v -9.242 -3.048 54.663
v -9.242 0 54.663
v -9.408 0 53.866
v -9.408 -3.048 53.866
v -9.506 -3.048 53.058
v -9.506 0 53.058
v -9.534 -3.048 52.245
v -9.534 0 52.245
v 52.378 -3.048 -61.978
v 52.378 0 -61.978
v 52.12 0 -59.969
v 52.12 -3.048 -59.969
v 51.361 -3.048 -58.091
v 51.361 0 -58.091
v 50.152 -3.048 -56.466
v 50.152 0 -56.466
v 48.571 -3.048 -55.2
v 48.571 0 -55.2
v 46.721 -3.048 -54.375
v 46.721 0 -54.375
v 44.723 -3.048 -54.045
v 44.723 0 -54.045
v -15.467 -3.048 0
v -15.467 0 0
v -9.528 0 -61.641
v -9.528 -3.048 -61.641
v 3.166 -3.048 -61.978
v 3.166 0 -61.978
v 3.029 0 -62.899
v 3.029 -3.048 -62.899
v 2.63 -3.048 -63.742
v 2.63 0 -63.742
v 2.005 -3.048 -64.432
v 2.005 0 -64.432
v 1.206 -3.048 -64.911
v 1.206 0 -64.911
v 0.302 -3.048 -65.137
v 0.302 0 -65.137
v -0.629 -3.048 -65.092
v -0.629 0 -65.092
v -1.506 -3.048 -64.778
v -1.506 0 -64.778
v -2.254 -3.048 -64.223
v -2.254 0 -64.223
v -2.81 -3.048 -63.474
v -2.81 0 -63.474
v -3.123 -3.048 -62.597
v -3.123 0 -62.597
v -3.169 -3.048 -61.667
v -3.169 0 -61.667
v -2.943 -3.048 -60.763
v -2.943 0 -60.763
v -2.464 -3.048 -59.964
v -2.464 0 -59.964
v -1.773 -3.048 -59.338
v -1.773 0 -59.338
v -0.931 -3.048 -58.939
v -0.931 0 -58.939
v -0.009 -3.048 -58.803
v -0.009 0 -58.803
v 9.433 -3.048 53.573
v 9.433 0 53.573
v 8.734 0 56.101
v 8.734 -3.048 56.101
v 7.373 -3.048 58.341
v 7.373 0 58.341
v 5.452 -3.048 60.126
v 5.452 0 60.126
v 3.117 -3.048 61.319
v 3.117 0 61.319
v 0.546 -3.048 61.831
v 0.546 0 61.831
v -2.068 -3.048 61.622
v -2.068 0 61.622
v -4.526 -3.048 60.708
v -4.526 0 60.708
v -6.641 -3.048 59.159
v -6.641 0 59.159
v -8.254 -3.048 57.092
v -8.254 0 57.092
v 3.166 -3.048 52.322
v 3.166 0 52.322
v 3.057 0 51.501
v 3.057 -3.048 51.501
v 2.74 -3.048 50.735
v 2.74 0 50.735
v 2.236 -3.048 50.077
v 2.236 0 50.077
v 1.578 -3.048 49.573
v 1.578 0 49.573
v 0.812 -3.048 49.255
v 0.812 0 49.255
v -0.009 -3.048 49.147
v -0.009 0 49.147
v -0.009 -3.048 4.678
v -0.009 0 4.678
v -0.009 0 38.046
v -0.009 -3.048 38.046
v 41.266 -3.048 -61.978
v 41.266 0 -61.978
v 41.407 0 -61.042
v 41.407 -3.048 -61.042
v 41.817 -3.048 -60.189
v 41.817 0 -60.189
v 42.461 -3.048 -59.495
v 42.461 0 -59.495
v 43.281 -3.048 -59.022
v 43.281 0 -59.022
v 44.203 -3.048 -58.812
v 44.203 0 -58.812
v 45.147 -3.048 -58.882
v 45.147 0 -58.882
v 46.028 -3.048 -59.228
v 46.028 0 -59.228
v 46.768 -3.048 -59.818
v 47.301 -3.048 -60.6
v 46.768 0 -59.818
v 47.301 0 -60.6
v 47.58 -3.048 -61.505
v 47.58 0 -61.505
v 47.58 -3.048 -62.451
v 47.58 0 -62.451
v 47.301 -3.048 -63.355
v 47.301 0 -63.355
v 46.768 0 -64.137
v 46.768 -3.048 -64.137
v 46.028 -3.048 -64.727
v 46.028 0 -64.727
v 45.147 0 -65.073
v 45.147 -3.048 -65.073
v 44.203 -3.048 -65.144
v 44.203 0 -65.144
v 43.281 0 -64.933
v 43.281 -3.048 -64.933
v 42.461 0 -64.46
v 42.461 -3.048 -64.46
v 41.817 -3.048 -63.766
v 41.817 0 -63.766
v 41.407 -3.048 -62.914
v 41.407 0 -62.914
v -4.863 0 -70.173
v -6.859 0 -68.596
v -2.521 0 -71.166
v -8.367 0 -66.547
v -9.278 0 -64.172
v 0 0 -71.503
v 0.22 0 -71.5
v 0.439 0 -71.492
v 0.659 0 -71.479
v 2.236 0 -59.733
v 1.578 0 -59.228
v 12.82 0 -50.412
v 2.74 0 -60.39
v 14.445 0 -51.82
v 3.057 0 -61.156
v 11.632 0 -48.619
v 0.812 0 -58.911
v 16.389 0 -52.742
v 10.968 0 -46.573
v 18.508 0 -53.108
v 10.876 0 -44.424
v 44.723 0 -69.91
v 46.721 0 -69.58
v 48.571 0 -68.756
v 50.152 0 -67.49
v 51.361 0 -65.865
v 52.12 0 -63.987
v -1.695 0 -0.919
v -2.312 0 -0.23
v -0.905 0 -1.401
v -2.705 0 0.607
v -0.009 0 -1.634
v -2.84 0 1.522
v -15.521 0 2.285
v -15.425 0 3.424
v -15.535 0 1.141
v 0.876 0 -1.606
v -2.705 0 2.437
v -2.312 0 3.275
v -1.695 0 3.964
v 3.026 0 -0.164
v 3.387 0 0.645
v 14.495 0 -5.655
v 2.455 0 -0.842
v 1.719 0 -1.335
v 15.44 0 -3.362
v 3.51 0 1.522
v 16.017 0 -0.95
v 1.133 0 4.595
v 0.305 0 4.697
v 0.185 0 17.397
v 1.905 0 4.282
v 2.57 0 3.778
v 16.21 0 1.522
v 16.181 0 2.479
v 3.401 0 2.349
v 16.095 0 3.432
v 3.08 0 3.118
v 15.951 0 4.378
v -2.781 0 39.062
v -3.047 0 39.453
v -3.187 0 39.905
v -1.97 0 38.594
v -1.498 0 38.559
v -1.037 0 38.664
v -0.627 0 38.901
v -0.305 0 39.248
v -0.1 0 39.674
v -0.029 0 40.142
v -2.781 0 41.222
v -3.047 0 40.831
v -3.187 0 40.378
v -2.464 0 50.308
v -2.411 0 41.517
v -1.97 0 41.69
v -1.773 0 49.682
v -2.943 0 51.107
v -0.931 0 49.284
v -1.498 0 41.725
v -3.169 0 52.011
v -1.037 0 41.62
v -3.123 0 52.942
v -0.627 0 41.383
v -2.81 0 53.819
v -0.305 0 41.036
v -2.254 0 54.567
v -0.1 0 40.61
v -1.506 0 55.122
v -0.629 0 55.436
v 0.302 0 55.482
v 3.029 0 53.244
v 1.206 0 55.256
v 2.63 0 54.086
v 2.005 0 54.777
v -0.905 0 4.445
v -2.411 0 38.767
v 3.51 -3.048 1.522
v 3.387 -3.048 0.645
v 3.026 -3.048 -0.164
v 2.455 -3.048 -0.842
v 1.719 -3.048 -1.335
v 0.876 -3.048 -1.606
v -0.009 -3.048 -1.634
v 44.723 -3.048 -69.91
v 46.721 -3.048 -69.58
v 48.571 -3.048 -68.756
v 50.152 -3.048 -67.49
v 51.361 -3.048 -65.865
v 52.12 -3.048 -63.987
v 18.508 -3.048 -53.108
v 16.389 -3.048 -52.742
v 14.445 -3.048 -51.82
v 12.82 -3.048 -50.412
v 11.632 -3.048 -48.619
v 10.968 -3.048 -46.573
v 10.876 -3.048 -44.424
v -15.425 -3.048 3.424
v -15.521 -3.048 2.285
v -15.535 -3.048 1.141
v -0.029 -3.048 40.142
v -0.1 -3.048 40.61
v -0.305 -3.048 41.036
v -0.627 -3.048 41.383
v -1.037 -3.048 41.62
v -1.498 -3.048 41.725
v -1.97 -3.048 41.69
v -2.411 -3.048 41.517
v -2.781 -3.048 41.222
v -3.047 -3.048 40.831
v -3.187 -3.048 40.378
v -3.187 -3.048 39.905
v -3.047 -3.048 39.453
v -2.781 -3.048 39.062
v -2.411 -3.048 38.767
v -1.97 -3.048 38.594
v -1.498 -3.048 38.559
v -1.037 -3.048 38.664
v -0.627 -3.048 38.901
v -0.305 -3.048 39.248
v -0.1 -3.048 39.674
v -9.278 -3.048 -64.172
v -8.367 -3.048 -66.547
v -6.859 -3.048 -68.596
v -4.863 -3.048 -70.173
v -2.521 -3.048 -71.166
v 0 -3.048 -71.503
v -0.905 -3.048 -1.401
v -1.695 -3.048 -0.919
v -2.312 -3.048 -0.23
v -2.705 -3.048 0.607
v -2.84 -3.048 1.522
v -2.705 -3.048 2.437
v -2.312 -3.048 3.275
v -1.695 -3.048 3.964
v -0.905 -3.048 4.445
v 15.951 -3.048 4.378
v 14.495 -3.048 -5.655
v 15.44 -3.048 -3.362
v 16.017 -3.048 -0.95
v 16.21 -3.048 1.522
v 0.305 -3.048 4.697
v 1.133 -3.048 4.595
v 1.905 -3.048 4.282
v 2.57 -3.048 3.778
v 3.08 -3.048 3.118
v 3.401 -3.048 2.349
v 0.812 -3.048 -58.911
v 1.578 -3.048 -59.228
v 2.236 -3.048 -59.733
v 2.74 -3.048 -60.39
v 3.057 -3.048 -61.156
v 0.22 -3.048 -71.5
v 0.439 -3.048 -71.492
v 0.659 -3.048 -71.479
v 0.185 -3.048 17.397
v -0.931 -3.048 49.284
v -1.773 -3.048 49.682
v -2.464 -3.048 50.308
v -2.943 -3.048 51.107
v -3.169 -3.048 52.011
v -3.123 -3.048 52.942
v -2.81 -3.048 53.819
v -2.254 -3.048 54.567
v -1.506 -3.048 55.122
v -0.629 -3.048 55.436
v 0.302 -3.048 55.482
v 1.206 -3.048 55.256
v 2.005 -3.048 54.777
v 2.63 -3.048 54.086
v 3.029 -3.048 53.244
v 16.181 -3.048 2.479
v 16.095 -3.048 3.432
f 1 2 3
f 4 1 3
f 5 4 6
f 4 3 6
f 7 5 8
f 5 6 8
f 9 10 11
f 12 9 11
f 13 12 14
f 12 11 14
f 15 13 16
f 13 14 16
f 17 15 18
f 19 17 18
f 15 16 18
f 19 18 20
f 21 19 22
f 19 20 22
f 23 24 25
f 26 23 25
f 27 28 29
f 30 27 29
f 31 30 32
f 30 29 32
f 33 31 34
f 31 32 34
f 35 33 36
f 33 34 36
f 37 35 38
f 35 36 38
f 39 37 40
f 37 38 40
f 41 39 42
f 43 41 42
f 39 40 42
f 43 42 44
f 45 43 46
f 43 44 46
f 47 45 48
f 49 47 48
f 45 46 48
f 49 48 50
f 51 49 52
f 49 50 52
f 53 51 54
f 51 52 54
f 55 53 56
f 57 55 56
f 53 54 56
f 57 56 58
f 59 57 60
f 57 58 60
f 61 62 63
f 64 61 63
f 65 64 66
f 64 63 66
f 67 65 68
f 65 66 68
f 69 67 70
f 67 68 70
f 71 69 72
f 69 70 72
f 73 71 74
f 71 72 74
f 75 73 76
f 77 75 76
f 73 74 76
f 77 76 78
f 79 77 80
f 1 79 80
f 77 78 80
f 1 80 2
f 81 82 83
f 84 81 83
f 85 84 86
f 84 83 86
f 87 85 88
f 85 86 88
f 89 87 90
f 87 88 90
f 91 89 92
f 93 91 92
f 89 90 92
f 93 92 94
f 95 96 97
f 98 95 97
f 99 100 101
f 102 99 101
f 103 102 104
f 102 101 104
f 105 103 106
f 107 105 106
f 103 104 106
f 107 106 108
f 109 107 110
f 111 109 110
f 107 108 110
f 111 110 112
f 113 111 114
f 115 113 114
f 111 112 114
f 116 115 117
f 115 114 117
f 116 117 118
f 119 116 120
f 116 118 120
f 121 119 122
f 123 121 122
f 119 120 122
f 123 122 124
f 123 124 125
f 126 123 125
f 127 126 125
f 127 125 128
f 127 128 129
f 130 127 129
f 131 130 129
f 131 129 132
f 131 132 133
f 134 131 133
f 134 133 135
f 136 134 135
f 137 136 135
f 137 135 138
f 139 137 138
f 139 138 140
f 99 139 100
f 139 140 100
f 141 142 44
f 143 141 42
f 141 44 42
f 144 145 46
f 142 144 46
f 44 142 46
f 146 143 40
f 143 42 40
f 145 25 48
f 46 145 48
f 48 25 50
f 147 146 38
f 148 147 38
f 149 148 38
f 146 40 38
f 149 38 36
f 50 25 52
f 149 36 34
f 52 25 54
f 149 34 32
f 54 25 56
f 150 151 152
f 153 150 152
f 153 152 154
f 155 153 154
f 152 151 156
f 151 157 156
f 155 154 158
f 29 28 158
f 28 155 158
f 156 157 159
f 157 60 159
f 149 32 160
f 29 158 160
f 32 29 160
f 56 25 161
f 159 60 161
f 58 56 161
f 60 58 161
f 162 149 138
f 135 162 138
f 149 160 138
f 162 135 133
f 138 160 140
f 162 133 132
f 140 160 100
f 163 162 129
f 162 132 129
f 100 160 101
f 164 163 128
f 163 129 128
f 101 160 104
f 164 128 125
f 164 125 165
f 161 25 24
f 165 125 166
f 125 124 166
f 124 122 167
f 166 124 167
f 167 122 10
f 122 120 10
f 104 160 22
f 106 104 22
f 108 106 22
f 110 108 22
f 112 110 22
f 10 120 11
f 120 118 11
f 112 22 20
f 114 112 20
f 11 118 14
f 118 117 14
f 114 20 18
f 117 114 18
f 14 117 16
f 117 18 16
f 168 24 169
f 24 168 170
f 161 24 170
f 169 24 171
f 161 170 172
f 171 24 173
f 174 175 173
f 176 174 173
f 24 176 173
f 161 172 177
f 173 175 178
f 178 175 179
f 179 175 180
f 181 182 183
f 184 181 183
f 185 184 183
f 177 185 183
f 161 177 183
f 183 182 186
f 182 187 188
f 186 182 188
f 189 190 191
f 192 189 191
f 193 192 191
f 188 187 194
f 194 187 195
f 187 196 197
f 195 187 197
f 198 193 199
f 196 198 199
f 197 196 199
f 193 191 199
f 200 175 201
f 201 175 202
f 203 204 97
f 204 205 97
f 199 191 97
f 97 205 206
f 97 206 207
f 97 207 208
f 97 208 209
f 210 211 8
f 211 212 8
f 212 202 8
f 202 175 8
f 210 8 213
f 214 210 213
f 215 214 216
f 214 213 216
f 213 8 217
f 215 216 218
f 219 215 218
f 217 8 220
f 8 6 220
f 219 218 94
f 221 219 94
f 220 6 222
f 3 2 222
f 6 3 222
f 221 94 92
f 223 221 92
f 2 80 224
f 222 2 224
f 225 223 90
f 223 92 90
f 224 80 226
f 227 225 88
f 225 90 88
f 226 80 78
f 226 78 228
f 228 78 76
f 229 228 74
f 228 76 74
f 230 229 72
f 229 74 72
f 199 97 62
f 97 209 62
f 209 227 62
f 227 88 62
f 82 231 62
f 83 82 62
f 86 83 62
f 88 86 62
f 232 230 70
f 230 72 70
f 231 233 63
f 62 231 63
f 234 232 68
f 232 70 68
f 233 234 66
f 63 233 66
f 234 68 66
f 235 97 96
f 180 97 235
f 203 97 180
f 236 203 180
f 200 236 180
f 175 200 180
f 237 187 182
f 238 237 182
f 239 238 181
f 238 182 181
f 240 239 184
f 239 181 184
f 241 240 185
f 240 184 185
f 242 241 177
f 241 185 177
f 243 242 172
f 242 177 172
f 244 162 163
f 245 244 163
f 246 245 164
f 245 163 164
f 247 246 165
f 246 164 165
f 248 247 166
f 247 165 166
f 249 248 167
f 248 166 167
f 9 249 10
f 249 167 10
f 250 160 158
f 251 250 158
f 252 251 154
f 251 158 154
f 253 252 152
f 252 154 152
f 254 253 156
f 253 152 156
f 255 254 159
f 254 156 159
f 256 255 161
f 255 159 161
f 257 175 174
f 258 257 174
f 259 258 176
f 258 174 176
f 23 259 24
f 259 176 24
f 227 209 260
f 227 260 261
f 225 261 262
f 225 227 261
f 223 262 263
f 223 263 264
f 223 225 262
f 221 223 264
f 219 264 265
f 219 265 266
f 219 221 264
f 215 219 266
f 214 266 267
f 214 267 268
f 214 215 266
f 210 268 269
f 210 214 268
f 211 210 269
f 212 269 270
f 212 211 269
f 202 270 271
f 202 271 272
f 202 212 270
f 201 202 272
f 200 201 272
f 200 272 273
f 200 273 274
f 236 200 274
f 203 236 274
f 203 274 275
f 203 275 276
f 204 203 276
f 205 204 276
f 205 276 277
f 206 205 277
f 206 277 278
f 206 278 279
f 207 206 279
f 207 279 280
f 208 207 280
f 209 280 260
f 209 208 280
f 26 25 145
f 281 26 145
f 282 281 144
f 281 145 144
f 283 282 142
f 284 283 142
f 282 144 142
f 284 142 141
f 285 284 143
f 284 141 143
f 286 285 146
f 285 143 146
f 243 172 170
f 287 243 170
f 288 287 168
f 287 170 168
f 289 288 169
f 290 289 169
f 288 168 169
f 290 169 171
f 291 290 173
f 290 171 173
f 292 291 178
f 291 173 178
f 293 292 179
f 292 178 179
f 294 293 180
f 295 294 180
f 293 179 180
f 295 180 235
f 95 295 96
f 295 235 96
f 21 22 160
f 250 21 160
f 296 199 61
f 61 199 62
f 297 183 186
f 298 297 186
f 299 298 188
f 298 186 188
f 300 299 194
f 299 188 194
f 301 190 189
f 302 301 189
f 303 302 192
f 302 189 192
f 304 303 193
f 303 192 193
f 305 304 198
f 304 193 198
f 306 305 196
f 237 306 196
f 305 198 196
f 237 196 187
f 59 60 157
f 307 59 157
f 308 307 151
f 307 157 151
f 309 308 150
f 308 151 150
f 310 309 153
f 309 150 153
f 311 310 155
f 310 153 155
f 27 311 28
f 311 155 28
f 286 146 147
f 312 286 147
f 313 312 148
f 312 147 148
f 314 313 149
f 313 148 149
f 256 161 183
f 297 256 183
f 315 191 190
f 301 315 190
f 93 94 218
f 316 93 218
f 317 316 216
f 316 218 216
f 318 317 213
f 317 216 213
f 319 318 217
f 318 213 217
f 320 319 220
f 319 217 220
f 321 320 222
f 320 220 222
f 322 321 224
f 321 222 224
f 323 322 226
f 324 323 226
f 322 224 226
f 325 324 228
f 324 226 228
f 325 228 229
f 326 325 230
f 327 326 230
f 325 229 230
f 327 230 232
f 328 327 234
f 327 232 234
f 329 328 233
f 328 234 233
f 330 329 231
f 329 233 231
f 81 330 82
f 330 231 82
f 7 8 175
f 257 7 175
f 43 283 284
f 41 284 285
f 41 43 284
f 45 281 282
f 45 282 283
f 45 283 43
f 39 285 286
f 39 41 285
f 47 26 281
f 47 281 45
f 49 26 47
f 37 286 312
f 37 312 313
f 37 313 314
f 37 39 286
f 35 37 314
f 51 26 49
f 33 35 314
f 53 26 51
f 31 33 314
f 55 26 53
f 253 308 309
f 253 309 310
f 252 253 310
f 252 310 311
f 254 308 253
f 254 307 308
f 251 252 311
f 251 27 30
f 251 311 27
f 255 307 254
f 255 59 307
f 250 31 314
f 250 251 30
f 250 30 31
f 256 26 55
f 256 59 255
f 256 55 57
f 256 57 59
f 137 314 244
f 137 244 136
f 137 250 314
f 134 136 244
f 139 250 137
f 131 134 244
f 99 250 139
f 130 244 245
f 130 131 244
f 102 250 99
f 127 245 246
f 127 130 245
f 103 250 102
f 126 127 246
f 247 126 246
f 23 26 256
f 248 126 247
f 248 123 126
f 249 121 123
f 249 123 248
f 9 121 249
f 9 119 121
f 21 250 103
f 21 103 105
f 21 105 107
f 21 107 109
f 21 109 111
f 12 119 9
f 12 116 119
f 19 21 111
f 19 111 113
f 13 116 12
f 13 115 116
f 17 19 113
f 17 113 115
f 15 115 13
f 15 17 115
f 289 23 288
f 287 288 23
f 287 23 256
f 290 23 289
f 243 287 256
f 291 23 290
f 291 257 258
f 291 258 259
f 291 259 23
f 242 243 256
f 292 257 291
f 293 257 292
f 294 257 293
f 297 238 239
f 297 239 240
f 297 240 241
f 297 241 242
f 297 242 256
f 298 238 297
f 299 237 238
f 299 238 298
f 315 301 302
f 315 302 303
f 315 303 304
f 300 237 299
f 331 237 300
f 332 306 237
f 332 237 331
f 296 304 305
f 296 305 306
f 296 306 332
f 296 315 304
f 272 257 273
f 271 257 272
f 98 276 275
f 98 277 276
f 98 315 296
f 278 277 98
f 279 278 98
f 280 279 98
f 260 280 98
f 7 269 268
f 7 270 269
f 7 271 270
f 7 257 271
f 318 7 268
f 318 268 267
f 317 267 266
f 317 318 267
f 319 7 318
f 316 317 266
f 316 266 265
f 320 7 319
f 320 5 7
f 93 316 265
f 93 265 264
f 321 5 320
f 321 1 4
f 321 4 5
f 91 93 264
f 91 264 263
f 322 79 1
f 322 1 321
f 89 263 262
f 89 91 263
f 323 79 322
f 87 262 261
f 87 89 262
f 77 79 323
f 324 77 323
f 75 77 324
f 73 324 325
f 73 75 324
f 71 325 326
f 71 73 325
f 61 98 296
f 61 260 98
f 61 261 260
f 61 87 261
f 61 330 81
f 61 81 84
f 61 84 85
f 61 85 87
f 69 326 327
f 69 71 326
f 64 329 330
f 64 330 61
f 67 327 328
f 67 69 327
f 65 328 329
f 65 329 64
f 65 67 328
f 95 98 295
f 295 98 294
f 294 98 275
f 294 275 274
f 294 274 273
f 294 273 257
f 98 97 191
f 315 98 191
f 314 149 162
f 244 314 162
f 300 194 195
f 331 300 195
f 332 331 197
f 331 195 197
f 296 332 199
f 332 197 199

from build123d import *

# Parameters (mm, degrees)
F0_R     = 1.5875
F1_DEPTH = 3.048


with BuildPart() as f1:
    # F0 (on Front) → F1 (new body)
    with BuildSketch(Plane.XZ):
        with BuildLine():
            ThreePointArc((-9.5341186691, 52.2447508267), (-6.7171678622, 45.5597172954), (-0.0094340062, 42.7972561321))
            ThreePointArc((-0.0094340062, 42.7972561321), (6.7257580846, 45.5870640413), (9.5155659938, 52.3222561321))
            ThreePointArc((9.5155659938, 52.3222561321), (9.4949130682, 52.9491625761), (9.4330438542, 53.573350395))
            ThreePointArc((9.4330438542, 53.573350395), (0.5455224312, 61.8310756357), (-9.2422673958, 54.6632842395))
            Line((-9.2422673958, 54.6632842395), (-9.5341186691, 52.2447508267))
        make_face()
        with BuildLine():
            ThreePointArc((3.1655659938, 52.3222561321), (2.235630024, 50.0771921018), (-0.0094340062, 49.1472561321))
            ThreePointArc((-0.0094340062, 49.1472561321), (-2.2544980365, 54.5673201623), (3.1655659938, 52.3222561321))
        make_face(mode=Mode.SUBTRACT)
        with BuildLine():
            ThreePointArc((9.5155659938, 52.3222561321), (6.7257580846, 45.5870640413), (-0.0094340062, 42.7972561321))
            Line((-0.0094340062, 42.7972561321), (-0.0094340062, 38.0458299899))
            Line((-0.0094340062, 38.0458299899), (0.1854236079, 17.3965493596))
            ThreePointArc((0.1854236079, 17.3965493596), (10.4432233162, 13.7633317509), (15.9512497798, 4.3780043978))
            Line((15.9512497798, 4.3780043978), (9.4330438542, 53.573350395))
            ThreePointArc((9.4330438542, 53.573350395), (9.4949130682, 52.9491625761), (9.5155659938, 52.3222561321))
        make_face()
        with BuildLine():
            Line((-0.0094340062, 38.0458299899), (-0.0094340062, 42.7972561321))
            ThreePointArc((-0.0094340062, 42.7972561321), (-6.7171678622, 45.5597172954), (-9.5341186691, 52.2447508267))
            Line((-9.5341186691, 52.2447508267), (-15.4254400006, 3.4241398184))
            ThreePointArc((-15.4254400006, 3.4241398184), (-10.3245703873, 13.2859483017), (-0.0094340062, 17.3935143465))
            Line((-0.0094340062, 17.3935143465), (-0.0094340062, 38.0458299899))
        make_face()
        with Locations((-1.6167838335, 40.1418484393)):
            Circle(F0_R, mode=Mode.SUBTRACT)
        with BuildLine():
            ThreePointArc((-9.2422673958, 54.6632842395), (-9.4658311447, 53.4633863439), (-9.5341186691, 52.2447508267))
            Line((-9.5341186691, 52.2447508267), (-9.2422673958, 54.6632842395))
        make_face()
        with BuildLine():
            Line((-0.0094340062, 4.678493973), (-0.0094340062, 17.3935143465))
            ThreePointArc((-0.0094340062, 17.3935143465), (-10.3245703873, 13.2859483017), (-15.4254400006, 3.4241398184))
            ThreePointArc((-15.4254400006, 3.4241398184), (-15.5386299257, 1.7131836533), (-15.4666248709, 0))
            ThreePointArc((-15.4666248709, 0), (-10.4652805135, -10.1123806344), (-0.0094340062, -14.3490020823))
            Line((-0.0094340062, -14.3490020823), (-0.0094340062, -1.6339817089))
            ThreePointArc((-0.0094340062, -1.6339817089), (-2.8397781032, 1.5222561321), (-0.0094340062, 4.678493973))
        make_face()
        with BuildLine():
            ThreePointArc((15.9512497798, 4.3780043978), (10.4432233162, 13.7633317509), (0.1854236079, 17.3965493596))
            Line((0.1854236079, 17.3965493596), (0.305262239, 4.6971147776))
            ThreePointArc((0.305262239, 4.6971147776), (2.5696684822, 3.7778876305), (3.5102218968, 1.5222561321))
            ThreePointArc((3.5102218968, 1.5222561321), (2.4549320784, -0.8415234148), (-0.0094340062, -1.6339817089))
            Line((-0.0094340062, -1.6339817089), (-0.0094340062, -14.3490020823))
            ThreePointArc((-0.0094340062, -14.3490020823), (8.4967936253, -12.09407127), (14.495092683, -5.6550472833))
            ThreePointArc((14.495092683, -5.6550472833), (15.7754870132, -2.1674373693), (16.2102218968, 1.5222561321))
            ThreePointArc((16.2102218968, 1.5222561321), (16.1453463055, 2.9559894332), (15.9512497798, 4.3780043978))
        make_face()
        with BuildLine():
            ThreePointArc((-0.0094340062, -14.3490020823), (-10.4652805135, -10.1123806344), (-15.4666248709, 0))
            Line((-15.4666248709, 0), (-9.5284841955, -61.6411305964))
            ThreePointArc((-9.5284841955, -61.6411305964), (-6.6245448741, -55.1245742942), (-0.0094340062, -52.4527438679))
            Line((-0.0094340062, -52.4527438679), (-0.0094340062, -14.3490020823))
        make_face()
        with BuildLine():
            ThreePointArc((14.495092683, -5.6550472833), (8.4967936253, -12.09407127), (-0.0094340062, -14.3490020823))
            Line((-0.0094340062, -14.3490020823), (-0.0094340062, -52.4527438679))
            ThreePointArc((-0.0094340062, -52.4527438679), (6.7257580846, -55.2425517771), (9.5155659938, -61.9777438679))
            Line((9.5155659938, -61.9777438679), (36.5030659938, -61.9777438679))
            ThreePointArc((36.5030659938, -61.9777438679), (38.9286766306, -56.2660907011), (44.7230299367, -54.0452713422))
            Line((44.7230299367, -54.0452713422), (18.5079615272, -53.1084211888))
            ThreePointArc((18.5079615272, -53.1084211888), (12.8201303591, -50.41150042), (10.8761098535, -44.4243818055))
            Line((10.8761098535, -44.4243818055), (14.495092683, -5.6550472833))
        make_face()
        with BuildLine():
            ThreePointArc((-0.0094340062, -52.4527438679), (-6.6245448741, -55.1245742942), (-9.5284841955, -61.6411305964))
            ThreePointArc((-9.5284841955, -61.6411305964), (-6.8593267813, -68.5962477752), (0, -71.502739196))
            Line((0, -71.502739196), (0.6586396335, -71.4792859855))
            ThreePointArc((0.6586396335, -71.4792859855), (6.9579552616, -68.4724426131), (9.5155659938, -61.9777438679))
            Line((9.5155659938, -61.9777438679), (3.1655659938, -61.9777438679))
            ThreePointArc((3.1655659938, -61.9777438679), (-2.2544980365, -64.2228078982), (-0.0094340062, -58.8027438679))
            Line((-0.0094340062, -58.8027438679), (-0.0094340062, -52.4527438679))
        make_face()
        with BuildLine():
            Line((0.6586396335, -71.4792859855), (0, -71.502739196))
            ThreePointArc((0, -71.502739196), (0.3295227253, -71.4967108988), (0.6586396335, -71.4792859855))
        make_face()
        with BuildLine():
            Line((36.5030659938, -61.9777438679), (9.5155659938, -61.9777438679))
            ThreePointArc((9.5155659938, -61.9777438679), (6.9579552616, -68.4724426131), (0.6586396335, -71.4792859855))
            Line((0.6586396335, -71.4792859855), (44.7230299367, -69.9102163936))
            ThreePointArc((44.7230299367, -69.9102163936), (38.9286766306, -67.6893970348), (36.5030659938, -61.9777438679))
        make_face()
        with BuildLine():
            ThreePointArc((44.7230299367, -54.0452713422), (38.9286766306, -56.2660907011), (36.5030659938, -61.9777438679))
            ThreePointArc((36.5030659938, -61.9777438679), (38.9286766306, -67.6893970348), (44.7230299367, -69.9102163936))
            ThreePointArc((44.7230299367, -69.9102163936), (50.1522191606, -67.4896332311), (52.3780659938, -61.9777438679))
            ThreePointArc((52.3780659938, -61.9777438679), (50.1522191606, -56.4658545048), (44.7230299367, -54.0452713422))
        make_face()
        with BuildLine():
            ThreePointArc((47.6155659938, -61.9777438679), (44.4405659938, -65.1527438679), (41.2655659938, -61.9777438679))
            ThreePointArc((41.2655659938, -61.9777438679), (44.4405659938, -58.8027438679), (47.6155659938, -61.9777438679))
        make_face(mode=Mode.SUBTRACT)
        with BuildLine():
            ThreePointArc((9.5155659938, -61.9777438679), (6.7257580846, -55.2425517771), (-0.0094340062, -52.4527438679))
            Line((-0.0094340062, -52.4527438679), (-0.0094340062, -58.8027438679))
            ThreePointArc((-0.0094340062, -58.8027438679), (2.235630024, -59.7326798377), (3.1655659938, -61.9777438679))
            Line((3.1655659938, -61.9777438679), (9.5155659938, -61.9777438679))
        make_face()
    extrude(amount=F1_DEPTH)


solid = f1.part
